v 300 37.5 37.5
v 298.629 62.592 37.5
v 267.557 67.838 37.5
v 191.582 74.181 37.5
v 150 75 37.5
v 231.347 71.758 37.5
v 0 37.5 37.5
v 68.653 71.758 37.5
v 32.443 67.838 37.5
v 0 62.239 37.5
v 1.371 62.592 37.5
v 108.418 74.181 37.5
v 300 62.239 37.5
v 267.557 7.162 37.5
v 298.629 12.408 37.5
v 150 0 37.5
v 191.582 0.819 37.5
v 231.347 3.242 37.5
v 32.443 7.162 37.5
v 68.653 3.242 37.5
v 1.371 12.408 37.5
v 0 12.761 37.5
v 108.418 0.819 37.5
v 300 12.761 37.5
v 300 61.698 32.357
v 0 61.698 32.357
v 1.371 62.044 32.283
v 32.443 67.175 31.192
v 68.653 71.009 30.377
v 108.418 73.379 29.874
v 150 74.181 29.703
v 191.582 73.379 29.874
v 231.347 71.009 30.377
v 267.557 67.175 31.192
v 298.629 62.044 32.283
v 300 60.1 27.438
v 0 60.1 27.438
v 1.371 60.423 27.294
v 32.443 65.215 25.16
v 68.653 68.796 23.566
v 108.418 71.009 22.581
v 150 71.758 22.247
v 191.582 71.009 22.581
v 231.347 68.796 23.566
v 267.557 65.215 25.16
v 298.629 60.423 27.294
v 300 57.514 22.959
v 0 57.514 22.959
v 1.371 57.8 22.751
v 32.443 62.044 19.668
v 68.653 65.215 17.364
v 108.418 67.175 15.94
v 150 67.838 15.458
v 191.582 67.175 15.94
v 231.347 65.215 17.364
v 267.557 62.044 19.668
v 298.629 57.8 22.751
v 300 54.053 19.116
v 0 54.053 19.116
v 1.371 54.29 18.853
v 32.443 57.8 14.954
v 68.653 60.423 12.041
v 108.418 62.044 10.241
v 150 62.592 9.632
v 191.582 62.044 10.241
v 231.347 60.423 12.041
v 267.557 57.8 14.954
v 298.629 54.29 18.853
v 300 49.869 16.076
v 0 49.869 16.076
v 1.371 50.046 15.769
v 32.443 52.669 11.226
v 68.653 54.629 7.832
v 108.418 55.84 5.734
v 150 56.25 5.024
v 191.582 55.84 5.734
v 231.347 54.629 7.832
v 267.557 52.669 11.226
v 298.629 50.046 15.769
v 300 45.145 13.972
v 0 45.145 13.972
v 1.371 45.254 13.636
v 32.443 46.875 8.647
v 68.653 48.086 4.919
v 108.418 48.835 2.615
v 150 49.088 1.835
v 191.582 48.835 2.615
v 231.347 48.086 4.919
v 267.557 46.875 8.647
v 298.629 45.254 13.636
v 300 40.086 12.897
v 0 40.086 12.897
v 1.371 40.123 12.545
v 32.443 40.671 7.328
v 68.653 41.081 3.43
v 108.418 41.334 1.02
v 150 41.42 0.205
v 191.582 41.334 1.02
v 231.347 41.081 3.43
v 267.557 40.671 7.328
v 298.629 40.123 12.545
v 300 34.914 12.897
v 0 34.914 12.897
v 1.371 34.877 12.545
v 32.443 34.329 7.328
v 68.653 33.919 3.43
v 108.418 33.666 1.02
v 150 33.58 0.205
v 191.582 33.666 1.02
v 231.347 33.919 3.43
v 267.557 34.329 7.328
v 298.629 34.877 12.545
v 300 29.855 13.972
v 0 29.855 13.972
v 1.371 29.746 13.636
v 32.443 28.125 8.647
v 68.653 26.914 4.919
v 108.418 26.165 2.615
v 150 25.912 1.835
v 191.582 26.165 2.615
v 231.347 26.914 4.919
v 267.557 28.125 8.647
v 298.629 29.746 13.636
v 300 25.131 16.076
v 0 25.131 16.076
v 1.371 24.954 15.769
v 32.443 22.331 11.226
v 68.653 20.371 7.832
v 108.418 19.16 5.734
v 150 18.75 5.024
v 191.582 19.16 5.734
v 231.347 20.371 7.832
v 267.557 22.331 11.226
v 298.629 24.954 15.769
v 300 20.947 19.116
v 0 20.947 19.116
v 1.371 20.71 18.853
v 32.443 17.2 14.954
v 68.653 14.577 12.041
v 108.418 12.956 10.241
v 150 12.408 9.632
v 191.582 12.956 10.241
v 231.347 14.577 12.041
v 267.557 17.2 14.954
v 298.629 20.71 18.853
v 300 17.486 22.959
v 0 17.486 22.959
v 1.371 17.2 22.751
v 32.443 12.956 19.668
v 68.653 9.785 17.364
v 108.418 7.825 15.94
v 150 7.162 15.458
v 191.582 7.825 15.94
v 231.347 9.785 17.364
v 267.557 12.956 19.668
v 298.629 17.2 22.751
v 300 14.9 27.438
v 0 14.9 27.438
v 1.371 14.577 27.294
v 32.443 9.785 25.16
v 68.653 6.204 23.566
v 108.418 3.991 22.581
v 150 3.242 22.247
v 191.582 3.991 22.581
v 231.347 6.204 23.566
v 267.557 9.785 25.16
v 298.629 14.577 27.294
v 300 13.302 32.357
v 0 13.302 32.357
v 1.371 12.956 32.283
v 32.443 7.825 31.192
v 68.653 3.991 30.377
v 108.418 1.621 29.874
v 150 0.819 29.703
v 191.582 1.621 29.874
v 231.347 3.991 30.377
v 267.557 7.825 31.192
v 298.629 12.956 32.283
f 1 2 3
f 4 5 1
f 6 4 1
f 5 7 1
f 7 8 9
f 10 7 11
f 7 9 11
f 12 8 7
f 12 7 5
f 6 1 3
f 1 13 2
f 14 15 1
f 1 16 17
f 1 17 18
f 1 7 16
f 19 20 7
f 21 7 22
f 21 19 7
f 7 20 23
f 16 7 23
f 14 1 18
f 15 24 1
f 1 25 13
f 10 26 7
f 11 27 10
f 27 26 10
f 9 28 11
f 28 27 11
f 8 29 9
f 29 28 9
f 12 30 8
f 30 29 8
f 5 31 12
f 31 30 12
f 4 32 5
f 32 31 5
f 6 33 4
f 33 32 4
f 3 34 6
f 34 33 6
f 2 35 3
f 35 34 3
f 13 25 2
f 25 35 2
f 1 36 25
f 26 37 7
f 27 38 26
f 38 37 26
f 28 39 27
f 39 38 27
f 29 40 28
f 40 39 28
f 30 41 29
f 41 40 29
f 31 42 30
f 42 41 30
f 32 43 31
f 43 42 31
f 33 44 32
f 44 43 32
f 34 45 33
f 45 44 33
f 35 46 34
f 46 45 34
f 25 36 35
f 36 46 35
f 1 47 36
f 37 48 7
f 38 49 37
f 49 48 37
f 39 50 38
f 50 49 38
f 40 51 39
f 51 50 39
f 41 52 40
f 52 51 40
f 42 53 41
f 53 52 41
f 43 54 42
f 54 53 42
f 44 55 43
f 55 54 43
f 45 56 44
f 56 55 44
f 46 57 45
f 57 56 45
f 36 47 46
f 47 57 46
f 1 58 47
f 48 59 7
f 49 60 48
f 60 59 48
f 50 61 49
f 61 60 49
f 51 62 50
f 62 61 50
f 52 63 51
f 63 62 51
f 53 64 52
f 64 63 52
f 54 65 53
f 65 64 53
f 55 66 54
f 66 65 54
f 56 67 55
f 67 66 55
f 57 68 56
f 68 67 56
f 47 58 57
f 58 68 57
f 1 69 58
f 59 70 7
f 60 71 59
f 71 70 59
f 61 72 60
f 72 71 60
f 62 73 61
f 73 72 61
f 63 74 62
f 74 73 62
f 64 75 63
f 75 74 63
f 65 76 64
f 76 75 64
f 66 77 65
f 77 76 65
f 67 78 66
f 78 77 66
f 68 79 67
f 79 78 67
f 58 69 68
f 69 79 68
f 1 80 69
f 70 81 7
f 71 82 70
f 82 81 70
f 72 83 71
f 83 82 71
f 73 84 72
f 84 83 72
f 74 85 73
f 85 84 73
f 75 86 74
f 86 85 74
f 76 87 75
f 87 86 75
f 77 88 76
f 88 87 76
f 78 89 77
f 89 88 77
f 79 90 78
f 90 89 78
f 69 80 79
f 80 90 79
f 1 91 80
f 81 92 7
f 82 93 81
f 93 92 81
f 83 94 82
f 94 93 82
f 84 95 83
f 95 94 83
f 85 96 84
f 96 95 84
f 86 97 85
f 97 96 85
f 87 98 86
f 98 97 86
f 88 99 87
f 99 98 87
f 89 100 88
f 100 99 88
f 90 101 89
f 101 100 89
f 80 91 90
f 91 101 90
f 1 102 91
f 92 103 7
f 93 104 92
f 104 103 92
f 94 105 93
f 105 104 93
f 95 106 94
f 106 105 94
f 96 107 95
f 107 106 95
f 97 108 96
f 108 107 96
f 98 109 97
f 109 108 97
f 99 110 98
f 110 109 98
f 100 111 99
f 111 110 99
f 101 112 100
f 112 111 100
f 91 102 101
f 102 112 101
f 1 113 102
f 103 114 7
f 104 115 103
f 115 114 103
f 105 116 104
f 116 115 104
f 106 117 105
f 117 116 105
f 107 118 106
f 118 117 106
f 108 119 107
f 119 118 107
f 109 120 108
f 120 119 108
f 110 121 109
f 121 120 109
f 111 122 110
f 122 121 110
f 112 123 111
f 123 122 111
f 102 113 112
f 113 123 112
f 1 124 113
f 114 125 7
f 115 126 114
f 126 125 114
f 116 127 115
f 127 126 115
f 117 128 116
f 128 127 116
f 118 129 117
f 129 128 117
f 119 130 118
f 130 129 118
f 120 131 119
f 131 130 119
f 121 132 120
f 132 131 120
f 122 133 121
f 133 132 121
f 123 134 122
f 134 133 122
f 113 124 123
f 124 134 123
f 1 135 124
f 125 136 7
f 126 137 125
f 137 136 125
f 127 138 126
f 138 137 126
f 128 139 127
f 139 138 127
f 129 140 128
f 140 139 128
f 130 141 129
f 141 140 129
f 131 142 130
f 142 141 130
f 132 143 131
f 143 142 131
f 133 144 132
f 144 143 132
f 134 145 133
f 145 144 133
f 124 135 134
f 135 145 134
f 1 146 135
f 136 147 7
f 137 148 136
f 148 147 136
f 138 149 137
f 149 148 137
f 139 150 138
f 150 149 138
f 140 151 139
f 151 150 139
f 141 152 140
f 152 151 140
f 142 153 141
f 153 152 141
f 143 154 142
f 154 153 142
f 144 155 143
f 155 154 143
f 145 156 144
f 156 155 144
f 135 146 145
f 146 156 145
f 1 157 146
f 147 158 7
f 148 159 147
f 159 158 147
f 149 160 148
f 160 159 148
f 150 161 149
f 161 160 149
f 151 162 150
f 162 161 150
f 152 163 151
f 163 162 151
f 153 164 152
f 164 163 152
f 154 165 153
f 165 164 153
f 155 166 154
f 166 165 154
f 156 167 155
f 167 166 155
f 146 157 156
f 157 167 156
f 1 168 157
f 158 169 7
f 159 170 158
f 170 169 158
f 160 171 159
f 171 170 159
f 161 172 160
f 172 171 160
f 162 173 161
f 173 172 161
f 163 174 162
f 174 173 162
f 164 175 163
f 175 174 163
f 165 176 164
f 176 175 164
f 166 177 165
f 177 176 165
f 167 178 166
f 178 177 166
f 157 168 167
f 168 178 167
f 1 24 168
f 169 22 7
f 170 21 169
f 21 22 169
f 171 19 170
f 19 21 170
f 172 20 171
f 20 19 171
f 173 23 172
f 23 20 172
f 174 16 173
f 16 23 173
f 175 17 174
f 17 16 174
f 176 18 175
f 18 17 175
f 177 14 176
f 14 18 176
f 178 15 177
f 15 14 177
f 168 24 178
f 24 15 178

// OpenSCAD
// file: ../common/ellipse.scad
module ellipse(r_x, r_y) {
    scale([1, r_y / r_x]) circle(r_x);
}
// main file
use <../common/ellipse.scad>

// TODO: confirm these dimensions before printing
toothbrush_length = 250;
toothbrush_thickness = 15;
toothpaste_length = 50;
toothpaste_thickness = 25;

// Goals
// - Long case (like a glasses case) for travel and convenience
// - Holds toothbrush
// - Holds travel-sized toothpaste tube

// Nice-to-haves
// - Rounded edges and maybe ovular prism shape
// - Toothbrush is held in place
// - A spot for placing a folded standard napkin faced by the bristels to minimize internal humidity

case_x_outer = (toothpaste_thickness + 50);
case_y_outer = toothbrush_length + 50;
ellipse_x = case_x_outer / 2;
ellipse_y = case_y_outer / 1.5;

translate([case_y_outer/2, case_x_outer/2, case_x_outer/2])
rotate([-90, 0, 90])
rotate_extrude(angle=180, convexity=10) 
difference() {
    ellipse(r_x=ellipse_x, r_y=ellipse_y);
    polygon([
        [0, -ellipse_y],
        [0, ellipse_y],
        [-ellipse_x, ellipse_y],
        [-ellipse_x, -ellipse_y],
    ]);
    polygon([
        [0, case_y_outer / 2],
        [0, ellipse_y],
        [ellipse_x, ellipse_y],
        [ellipse_x, case_y_outer / 2],
    ]);
    polygon([
        [0, -case_y_outer / 2],
        [0, -ellipse_y],
        [ellipse_x, -ellipse_y],
        [ellipse_x, -case_y_outer / 2],
    ]);
}
